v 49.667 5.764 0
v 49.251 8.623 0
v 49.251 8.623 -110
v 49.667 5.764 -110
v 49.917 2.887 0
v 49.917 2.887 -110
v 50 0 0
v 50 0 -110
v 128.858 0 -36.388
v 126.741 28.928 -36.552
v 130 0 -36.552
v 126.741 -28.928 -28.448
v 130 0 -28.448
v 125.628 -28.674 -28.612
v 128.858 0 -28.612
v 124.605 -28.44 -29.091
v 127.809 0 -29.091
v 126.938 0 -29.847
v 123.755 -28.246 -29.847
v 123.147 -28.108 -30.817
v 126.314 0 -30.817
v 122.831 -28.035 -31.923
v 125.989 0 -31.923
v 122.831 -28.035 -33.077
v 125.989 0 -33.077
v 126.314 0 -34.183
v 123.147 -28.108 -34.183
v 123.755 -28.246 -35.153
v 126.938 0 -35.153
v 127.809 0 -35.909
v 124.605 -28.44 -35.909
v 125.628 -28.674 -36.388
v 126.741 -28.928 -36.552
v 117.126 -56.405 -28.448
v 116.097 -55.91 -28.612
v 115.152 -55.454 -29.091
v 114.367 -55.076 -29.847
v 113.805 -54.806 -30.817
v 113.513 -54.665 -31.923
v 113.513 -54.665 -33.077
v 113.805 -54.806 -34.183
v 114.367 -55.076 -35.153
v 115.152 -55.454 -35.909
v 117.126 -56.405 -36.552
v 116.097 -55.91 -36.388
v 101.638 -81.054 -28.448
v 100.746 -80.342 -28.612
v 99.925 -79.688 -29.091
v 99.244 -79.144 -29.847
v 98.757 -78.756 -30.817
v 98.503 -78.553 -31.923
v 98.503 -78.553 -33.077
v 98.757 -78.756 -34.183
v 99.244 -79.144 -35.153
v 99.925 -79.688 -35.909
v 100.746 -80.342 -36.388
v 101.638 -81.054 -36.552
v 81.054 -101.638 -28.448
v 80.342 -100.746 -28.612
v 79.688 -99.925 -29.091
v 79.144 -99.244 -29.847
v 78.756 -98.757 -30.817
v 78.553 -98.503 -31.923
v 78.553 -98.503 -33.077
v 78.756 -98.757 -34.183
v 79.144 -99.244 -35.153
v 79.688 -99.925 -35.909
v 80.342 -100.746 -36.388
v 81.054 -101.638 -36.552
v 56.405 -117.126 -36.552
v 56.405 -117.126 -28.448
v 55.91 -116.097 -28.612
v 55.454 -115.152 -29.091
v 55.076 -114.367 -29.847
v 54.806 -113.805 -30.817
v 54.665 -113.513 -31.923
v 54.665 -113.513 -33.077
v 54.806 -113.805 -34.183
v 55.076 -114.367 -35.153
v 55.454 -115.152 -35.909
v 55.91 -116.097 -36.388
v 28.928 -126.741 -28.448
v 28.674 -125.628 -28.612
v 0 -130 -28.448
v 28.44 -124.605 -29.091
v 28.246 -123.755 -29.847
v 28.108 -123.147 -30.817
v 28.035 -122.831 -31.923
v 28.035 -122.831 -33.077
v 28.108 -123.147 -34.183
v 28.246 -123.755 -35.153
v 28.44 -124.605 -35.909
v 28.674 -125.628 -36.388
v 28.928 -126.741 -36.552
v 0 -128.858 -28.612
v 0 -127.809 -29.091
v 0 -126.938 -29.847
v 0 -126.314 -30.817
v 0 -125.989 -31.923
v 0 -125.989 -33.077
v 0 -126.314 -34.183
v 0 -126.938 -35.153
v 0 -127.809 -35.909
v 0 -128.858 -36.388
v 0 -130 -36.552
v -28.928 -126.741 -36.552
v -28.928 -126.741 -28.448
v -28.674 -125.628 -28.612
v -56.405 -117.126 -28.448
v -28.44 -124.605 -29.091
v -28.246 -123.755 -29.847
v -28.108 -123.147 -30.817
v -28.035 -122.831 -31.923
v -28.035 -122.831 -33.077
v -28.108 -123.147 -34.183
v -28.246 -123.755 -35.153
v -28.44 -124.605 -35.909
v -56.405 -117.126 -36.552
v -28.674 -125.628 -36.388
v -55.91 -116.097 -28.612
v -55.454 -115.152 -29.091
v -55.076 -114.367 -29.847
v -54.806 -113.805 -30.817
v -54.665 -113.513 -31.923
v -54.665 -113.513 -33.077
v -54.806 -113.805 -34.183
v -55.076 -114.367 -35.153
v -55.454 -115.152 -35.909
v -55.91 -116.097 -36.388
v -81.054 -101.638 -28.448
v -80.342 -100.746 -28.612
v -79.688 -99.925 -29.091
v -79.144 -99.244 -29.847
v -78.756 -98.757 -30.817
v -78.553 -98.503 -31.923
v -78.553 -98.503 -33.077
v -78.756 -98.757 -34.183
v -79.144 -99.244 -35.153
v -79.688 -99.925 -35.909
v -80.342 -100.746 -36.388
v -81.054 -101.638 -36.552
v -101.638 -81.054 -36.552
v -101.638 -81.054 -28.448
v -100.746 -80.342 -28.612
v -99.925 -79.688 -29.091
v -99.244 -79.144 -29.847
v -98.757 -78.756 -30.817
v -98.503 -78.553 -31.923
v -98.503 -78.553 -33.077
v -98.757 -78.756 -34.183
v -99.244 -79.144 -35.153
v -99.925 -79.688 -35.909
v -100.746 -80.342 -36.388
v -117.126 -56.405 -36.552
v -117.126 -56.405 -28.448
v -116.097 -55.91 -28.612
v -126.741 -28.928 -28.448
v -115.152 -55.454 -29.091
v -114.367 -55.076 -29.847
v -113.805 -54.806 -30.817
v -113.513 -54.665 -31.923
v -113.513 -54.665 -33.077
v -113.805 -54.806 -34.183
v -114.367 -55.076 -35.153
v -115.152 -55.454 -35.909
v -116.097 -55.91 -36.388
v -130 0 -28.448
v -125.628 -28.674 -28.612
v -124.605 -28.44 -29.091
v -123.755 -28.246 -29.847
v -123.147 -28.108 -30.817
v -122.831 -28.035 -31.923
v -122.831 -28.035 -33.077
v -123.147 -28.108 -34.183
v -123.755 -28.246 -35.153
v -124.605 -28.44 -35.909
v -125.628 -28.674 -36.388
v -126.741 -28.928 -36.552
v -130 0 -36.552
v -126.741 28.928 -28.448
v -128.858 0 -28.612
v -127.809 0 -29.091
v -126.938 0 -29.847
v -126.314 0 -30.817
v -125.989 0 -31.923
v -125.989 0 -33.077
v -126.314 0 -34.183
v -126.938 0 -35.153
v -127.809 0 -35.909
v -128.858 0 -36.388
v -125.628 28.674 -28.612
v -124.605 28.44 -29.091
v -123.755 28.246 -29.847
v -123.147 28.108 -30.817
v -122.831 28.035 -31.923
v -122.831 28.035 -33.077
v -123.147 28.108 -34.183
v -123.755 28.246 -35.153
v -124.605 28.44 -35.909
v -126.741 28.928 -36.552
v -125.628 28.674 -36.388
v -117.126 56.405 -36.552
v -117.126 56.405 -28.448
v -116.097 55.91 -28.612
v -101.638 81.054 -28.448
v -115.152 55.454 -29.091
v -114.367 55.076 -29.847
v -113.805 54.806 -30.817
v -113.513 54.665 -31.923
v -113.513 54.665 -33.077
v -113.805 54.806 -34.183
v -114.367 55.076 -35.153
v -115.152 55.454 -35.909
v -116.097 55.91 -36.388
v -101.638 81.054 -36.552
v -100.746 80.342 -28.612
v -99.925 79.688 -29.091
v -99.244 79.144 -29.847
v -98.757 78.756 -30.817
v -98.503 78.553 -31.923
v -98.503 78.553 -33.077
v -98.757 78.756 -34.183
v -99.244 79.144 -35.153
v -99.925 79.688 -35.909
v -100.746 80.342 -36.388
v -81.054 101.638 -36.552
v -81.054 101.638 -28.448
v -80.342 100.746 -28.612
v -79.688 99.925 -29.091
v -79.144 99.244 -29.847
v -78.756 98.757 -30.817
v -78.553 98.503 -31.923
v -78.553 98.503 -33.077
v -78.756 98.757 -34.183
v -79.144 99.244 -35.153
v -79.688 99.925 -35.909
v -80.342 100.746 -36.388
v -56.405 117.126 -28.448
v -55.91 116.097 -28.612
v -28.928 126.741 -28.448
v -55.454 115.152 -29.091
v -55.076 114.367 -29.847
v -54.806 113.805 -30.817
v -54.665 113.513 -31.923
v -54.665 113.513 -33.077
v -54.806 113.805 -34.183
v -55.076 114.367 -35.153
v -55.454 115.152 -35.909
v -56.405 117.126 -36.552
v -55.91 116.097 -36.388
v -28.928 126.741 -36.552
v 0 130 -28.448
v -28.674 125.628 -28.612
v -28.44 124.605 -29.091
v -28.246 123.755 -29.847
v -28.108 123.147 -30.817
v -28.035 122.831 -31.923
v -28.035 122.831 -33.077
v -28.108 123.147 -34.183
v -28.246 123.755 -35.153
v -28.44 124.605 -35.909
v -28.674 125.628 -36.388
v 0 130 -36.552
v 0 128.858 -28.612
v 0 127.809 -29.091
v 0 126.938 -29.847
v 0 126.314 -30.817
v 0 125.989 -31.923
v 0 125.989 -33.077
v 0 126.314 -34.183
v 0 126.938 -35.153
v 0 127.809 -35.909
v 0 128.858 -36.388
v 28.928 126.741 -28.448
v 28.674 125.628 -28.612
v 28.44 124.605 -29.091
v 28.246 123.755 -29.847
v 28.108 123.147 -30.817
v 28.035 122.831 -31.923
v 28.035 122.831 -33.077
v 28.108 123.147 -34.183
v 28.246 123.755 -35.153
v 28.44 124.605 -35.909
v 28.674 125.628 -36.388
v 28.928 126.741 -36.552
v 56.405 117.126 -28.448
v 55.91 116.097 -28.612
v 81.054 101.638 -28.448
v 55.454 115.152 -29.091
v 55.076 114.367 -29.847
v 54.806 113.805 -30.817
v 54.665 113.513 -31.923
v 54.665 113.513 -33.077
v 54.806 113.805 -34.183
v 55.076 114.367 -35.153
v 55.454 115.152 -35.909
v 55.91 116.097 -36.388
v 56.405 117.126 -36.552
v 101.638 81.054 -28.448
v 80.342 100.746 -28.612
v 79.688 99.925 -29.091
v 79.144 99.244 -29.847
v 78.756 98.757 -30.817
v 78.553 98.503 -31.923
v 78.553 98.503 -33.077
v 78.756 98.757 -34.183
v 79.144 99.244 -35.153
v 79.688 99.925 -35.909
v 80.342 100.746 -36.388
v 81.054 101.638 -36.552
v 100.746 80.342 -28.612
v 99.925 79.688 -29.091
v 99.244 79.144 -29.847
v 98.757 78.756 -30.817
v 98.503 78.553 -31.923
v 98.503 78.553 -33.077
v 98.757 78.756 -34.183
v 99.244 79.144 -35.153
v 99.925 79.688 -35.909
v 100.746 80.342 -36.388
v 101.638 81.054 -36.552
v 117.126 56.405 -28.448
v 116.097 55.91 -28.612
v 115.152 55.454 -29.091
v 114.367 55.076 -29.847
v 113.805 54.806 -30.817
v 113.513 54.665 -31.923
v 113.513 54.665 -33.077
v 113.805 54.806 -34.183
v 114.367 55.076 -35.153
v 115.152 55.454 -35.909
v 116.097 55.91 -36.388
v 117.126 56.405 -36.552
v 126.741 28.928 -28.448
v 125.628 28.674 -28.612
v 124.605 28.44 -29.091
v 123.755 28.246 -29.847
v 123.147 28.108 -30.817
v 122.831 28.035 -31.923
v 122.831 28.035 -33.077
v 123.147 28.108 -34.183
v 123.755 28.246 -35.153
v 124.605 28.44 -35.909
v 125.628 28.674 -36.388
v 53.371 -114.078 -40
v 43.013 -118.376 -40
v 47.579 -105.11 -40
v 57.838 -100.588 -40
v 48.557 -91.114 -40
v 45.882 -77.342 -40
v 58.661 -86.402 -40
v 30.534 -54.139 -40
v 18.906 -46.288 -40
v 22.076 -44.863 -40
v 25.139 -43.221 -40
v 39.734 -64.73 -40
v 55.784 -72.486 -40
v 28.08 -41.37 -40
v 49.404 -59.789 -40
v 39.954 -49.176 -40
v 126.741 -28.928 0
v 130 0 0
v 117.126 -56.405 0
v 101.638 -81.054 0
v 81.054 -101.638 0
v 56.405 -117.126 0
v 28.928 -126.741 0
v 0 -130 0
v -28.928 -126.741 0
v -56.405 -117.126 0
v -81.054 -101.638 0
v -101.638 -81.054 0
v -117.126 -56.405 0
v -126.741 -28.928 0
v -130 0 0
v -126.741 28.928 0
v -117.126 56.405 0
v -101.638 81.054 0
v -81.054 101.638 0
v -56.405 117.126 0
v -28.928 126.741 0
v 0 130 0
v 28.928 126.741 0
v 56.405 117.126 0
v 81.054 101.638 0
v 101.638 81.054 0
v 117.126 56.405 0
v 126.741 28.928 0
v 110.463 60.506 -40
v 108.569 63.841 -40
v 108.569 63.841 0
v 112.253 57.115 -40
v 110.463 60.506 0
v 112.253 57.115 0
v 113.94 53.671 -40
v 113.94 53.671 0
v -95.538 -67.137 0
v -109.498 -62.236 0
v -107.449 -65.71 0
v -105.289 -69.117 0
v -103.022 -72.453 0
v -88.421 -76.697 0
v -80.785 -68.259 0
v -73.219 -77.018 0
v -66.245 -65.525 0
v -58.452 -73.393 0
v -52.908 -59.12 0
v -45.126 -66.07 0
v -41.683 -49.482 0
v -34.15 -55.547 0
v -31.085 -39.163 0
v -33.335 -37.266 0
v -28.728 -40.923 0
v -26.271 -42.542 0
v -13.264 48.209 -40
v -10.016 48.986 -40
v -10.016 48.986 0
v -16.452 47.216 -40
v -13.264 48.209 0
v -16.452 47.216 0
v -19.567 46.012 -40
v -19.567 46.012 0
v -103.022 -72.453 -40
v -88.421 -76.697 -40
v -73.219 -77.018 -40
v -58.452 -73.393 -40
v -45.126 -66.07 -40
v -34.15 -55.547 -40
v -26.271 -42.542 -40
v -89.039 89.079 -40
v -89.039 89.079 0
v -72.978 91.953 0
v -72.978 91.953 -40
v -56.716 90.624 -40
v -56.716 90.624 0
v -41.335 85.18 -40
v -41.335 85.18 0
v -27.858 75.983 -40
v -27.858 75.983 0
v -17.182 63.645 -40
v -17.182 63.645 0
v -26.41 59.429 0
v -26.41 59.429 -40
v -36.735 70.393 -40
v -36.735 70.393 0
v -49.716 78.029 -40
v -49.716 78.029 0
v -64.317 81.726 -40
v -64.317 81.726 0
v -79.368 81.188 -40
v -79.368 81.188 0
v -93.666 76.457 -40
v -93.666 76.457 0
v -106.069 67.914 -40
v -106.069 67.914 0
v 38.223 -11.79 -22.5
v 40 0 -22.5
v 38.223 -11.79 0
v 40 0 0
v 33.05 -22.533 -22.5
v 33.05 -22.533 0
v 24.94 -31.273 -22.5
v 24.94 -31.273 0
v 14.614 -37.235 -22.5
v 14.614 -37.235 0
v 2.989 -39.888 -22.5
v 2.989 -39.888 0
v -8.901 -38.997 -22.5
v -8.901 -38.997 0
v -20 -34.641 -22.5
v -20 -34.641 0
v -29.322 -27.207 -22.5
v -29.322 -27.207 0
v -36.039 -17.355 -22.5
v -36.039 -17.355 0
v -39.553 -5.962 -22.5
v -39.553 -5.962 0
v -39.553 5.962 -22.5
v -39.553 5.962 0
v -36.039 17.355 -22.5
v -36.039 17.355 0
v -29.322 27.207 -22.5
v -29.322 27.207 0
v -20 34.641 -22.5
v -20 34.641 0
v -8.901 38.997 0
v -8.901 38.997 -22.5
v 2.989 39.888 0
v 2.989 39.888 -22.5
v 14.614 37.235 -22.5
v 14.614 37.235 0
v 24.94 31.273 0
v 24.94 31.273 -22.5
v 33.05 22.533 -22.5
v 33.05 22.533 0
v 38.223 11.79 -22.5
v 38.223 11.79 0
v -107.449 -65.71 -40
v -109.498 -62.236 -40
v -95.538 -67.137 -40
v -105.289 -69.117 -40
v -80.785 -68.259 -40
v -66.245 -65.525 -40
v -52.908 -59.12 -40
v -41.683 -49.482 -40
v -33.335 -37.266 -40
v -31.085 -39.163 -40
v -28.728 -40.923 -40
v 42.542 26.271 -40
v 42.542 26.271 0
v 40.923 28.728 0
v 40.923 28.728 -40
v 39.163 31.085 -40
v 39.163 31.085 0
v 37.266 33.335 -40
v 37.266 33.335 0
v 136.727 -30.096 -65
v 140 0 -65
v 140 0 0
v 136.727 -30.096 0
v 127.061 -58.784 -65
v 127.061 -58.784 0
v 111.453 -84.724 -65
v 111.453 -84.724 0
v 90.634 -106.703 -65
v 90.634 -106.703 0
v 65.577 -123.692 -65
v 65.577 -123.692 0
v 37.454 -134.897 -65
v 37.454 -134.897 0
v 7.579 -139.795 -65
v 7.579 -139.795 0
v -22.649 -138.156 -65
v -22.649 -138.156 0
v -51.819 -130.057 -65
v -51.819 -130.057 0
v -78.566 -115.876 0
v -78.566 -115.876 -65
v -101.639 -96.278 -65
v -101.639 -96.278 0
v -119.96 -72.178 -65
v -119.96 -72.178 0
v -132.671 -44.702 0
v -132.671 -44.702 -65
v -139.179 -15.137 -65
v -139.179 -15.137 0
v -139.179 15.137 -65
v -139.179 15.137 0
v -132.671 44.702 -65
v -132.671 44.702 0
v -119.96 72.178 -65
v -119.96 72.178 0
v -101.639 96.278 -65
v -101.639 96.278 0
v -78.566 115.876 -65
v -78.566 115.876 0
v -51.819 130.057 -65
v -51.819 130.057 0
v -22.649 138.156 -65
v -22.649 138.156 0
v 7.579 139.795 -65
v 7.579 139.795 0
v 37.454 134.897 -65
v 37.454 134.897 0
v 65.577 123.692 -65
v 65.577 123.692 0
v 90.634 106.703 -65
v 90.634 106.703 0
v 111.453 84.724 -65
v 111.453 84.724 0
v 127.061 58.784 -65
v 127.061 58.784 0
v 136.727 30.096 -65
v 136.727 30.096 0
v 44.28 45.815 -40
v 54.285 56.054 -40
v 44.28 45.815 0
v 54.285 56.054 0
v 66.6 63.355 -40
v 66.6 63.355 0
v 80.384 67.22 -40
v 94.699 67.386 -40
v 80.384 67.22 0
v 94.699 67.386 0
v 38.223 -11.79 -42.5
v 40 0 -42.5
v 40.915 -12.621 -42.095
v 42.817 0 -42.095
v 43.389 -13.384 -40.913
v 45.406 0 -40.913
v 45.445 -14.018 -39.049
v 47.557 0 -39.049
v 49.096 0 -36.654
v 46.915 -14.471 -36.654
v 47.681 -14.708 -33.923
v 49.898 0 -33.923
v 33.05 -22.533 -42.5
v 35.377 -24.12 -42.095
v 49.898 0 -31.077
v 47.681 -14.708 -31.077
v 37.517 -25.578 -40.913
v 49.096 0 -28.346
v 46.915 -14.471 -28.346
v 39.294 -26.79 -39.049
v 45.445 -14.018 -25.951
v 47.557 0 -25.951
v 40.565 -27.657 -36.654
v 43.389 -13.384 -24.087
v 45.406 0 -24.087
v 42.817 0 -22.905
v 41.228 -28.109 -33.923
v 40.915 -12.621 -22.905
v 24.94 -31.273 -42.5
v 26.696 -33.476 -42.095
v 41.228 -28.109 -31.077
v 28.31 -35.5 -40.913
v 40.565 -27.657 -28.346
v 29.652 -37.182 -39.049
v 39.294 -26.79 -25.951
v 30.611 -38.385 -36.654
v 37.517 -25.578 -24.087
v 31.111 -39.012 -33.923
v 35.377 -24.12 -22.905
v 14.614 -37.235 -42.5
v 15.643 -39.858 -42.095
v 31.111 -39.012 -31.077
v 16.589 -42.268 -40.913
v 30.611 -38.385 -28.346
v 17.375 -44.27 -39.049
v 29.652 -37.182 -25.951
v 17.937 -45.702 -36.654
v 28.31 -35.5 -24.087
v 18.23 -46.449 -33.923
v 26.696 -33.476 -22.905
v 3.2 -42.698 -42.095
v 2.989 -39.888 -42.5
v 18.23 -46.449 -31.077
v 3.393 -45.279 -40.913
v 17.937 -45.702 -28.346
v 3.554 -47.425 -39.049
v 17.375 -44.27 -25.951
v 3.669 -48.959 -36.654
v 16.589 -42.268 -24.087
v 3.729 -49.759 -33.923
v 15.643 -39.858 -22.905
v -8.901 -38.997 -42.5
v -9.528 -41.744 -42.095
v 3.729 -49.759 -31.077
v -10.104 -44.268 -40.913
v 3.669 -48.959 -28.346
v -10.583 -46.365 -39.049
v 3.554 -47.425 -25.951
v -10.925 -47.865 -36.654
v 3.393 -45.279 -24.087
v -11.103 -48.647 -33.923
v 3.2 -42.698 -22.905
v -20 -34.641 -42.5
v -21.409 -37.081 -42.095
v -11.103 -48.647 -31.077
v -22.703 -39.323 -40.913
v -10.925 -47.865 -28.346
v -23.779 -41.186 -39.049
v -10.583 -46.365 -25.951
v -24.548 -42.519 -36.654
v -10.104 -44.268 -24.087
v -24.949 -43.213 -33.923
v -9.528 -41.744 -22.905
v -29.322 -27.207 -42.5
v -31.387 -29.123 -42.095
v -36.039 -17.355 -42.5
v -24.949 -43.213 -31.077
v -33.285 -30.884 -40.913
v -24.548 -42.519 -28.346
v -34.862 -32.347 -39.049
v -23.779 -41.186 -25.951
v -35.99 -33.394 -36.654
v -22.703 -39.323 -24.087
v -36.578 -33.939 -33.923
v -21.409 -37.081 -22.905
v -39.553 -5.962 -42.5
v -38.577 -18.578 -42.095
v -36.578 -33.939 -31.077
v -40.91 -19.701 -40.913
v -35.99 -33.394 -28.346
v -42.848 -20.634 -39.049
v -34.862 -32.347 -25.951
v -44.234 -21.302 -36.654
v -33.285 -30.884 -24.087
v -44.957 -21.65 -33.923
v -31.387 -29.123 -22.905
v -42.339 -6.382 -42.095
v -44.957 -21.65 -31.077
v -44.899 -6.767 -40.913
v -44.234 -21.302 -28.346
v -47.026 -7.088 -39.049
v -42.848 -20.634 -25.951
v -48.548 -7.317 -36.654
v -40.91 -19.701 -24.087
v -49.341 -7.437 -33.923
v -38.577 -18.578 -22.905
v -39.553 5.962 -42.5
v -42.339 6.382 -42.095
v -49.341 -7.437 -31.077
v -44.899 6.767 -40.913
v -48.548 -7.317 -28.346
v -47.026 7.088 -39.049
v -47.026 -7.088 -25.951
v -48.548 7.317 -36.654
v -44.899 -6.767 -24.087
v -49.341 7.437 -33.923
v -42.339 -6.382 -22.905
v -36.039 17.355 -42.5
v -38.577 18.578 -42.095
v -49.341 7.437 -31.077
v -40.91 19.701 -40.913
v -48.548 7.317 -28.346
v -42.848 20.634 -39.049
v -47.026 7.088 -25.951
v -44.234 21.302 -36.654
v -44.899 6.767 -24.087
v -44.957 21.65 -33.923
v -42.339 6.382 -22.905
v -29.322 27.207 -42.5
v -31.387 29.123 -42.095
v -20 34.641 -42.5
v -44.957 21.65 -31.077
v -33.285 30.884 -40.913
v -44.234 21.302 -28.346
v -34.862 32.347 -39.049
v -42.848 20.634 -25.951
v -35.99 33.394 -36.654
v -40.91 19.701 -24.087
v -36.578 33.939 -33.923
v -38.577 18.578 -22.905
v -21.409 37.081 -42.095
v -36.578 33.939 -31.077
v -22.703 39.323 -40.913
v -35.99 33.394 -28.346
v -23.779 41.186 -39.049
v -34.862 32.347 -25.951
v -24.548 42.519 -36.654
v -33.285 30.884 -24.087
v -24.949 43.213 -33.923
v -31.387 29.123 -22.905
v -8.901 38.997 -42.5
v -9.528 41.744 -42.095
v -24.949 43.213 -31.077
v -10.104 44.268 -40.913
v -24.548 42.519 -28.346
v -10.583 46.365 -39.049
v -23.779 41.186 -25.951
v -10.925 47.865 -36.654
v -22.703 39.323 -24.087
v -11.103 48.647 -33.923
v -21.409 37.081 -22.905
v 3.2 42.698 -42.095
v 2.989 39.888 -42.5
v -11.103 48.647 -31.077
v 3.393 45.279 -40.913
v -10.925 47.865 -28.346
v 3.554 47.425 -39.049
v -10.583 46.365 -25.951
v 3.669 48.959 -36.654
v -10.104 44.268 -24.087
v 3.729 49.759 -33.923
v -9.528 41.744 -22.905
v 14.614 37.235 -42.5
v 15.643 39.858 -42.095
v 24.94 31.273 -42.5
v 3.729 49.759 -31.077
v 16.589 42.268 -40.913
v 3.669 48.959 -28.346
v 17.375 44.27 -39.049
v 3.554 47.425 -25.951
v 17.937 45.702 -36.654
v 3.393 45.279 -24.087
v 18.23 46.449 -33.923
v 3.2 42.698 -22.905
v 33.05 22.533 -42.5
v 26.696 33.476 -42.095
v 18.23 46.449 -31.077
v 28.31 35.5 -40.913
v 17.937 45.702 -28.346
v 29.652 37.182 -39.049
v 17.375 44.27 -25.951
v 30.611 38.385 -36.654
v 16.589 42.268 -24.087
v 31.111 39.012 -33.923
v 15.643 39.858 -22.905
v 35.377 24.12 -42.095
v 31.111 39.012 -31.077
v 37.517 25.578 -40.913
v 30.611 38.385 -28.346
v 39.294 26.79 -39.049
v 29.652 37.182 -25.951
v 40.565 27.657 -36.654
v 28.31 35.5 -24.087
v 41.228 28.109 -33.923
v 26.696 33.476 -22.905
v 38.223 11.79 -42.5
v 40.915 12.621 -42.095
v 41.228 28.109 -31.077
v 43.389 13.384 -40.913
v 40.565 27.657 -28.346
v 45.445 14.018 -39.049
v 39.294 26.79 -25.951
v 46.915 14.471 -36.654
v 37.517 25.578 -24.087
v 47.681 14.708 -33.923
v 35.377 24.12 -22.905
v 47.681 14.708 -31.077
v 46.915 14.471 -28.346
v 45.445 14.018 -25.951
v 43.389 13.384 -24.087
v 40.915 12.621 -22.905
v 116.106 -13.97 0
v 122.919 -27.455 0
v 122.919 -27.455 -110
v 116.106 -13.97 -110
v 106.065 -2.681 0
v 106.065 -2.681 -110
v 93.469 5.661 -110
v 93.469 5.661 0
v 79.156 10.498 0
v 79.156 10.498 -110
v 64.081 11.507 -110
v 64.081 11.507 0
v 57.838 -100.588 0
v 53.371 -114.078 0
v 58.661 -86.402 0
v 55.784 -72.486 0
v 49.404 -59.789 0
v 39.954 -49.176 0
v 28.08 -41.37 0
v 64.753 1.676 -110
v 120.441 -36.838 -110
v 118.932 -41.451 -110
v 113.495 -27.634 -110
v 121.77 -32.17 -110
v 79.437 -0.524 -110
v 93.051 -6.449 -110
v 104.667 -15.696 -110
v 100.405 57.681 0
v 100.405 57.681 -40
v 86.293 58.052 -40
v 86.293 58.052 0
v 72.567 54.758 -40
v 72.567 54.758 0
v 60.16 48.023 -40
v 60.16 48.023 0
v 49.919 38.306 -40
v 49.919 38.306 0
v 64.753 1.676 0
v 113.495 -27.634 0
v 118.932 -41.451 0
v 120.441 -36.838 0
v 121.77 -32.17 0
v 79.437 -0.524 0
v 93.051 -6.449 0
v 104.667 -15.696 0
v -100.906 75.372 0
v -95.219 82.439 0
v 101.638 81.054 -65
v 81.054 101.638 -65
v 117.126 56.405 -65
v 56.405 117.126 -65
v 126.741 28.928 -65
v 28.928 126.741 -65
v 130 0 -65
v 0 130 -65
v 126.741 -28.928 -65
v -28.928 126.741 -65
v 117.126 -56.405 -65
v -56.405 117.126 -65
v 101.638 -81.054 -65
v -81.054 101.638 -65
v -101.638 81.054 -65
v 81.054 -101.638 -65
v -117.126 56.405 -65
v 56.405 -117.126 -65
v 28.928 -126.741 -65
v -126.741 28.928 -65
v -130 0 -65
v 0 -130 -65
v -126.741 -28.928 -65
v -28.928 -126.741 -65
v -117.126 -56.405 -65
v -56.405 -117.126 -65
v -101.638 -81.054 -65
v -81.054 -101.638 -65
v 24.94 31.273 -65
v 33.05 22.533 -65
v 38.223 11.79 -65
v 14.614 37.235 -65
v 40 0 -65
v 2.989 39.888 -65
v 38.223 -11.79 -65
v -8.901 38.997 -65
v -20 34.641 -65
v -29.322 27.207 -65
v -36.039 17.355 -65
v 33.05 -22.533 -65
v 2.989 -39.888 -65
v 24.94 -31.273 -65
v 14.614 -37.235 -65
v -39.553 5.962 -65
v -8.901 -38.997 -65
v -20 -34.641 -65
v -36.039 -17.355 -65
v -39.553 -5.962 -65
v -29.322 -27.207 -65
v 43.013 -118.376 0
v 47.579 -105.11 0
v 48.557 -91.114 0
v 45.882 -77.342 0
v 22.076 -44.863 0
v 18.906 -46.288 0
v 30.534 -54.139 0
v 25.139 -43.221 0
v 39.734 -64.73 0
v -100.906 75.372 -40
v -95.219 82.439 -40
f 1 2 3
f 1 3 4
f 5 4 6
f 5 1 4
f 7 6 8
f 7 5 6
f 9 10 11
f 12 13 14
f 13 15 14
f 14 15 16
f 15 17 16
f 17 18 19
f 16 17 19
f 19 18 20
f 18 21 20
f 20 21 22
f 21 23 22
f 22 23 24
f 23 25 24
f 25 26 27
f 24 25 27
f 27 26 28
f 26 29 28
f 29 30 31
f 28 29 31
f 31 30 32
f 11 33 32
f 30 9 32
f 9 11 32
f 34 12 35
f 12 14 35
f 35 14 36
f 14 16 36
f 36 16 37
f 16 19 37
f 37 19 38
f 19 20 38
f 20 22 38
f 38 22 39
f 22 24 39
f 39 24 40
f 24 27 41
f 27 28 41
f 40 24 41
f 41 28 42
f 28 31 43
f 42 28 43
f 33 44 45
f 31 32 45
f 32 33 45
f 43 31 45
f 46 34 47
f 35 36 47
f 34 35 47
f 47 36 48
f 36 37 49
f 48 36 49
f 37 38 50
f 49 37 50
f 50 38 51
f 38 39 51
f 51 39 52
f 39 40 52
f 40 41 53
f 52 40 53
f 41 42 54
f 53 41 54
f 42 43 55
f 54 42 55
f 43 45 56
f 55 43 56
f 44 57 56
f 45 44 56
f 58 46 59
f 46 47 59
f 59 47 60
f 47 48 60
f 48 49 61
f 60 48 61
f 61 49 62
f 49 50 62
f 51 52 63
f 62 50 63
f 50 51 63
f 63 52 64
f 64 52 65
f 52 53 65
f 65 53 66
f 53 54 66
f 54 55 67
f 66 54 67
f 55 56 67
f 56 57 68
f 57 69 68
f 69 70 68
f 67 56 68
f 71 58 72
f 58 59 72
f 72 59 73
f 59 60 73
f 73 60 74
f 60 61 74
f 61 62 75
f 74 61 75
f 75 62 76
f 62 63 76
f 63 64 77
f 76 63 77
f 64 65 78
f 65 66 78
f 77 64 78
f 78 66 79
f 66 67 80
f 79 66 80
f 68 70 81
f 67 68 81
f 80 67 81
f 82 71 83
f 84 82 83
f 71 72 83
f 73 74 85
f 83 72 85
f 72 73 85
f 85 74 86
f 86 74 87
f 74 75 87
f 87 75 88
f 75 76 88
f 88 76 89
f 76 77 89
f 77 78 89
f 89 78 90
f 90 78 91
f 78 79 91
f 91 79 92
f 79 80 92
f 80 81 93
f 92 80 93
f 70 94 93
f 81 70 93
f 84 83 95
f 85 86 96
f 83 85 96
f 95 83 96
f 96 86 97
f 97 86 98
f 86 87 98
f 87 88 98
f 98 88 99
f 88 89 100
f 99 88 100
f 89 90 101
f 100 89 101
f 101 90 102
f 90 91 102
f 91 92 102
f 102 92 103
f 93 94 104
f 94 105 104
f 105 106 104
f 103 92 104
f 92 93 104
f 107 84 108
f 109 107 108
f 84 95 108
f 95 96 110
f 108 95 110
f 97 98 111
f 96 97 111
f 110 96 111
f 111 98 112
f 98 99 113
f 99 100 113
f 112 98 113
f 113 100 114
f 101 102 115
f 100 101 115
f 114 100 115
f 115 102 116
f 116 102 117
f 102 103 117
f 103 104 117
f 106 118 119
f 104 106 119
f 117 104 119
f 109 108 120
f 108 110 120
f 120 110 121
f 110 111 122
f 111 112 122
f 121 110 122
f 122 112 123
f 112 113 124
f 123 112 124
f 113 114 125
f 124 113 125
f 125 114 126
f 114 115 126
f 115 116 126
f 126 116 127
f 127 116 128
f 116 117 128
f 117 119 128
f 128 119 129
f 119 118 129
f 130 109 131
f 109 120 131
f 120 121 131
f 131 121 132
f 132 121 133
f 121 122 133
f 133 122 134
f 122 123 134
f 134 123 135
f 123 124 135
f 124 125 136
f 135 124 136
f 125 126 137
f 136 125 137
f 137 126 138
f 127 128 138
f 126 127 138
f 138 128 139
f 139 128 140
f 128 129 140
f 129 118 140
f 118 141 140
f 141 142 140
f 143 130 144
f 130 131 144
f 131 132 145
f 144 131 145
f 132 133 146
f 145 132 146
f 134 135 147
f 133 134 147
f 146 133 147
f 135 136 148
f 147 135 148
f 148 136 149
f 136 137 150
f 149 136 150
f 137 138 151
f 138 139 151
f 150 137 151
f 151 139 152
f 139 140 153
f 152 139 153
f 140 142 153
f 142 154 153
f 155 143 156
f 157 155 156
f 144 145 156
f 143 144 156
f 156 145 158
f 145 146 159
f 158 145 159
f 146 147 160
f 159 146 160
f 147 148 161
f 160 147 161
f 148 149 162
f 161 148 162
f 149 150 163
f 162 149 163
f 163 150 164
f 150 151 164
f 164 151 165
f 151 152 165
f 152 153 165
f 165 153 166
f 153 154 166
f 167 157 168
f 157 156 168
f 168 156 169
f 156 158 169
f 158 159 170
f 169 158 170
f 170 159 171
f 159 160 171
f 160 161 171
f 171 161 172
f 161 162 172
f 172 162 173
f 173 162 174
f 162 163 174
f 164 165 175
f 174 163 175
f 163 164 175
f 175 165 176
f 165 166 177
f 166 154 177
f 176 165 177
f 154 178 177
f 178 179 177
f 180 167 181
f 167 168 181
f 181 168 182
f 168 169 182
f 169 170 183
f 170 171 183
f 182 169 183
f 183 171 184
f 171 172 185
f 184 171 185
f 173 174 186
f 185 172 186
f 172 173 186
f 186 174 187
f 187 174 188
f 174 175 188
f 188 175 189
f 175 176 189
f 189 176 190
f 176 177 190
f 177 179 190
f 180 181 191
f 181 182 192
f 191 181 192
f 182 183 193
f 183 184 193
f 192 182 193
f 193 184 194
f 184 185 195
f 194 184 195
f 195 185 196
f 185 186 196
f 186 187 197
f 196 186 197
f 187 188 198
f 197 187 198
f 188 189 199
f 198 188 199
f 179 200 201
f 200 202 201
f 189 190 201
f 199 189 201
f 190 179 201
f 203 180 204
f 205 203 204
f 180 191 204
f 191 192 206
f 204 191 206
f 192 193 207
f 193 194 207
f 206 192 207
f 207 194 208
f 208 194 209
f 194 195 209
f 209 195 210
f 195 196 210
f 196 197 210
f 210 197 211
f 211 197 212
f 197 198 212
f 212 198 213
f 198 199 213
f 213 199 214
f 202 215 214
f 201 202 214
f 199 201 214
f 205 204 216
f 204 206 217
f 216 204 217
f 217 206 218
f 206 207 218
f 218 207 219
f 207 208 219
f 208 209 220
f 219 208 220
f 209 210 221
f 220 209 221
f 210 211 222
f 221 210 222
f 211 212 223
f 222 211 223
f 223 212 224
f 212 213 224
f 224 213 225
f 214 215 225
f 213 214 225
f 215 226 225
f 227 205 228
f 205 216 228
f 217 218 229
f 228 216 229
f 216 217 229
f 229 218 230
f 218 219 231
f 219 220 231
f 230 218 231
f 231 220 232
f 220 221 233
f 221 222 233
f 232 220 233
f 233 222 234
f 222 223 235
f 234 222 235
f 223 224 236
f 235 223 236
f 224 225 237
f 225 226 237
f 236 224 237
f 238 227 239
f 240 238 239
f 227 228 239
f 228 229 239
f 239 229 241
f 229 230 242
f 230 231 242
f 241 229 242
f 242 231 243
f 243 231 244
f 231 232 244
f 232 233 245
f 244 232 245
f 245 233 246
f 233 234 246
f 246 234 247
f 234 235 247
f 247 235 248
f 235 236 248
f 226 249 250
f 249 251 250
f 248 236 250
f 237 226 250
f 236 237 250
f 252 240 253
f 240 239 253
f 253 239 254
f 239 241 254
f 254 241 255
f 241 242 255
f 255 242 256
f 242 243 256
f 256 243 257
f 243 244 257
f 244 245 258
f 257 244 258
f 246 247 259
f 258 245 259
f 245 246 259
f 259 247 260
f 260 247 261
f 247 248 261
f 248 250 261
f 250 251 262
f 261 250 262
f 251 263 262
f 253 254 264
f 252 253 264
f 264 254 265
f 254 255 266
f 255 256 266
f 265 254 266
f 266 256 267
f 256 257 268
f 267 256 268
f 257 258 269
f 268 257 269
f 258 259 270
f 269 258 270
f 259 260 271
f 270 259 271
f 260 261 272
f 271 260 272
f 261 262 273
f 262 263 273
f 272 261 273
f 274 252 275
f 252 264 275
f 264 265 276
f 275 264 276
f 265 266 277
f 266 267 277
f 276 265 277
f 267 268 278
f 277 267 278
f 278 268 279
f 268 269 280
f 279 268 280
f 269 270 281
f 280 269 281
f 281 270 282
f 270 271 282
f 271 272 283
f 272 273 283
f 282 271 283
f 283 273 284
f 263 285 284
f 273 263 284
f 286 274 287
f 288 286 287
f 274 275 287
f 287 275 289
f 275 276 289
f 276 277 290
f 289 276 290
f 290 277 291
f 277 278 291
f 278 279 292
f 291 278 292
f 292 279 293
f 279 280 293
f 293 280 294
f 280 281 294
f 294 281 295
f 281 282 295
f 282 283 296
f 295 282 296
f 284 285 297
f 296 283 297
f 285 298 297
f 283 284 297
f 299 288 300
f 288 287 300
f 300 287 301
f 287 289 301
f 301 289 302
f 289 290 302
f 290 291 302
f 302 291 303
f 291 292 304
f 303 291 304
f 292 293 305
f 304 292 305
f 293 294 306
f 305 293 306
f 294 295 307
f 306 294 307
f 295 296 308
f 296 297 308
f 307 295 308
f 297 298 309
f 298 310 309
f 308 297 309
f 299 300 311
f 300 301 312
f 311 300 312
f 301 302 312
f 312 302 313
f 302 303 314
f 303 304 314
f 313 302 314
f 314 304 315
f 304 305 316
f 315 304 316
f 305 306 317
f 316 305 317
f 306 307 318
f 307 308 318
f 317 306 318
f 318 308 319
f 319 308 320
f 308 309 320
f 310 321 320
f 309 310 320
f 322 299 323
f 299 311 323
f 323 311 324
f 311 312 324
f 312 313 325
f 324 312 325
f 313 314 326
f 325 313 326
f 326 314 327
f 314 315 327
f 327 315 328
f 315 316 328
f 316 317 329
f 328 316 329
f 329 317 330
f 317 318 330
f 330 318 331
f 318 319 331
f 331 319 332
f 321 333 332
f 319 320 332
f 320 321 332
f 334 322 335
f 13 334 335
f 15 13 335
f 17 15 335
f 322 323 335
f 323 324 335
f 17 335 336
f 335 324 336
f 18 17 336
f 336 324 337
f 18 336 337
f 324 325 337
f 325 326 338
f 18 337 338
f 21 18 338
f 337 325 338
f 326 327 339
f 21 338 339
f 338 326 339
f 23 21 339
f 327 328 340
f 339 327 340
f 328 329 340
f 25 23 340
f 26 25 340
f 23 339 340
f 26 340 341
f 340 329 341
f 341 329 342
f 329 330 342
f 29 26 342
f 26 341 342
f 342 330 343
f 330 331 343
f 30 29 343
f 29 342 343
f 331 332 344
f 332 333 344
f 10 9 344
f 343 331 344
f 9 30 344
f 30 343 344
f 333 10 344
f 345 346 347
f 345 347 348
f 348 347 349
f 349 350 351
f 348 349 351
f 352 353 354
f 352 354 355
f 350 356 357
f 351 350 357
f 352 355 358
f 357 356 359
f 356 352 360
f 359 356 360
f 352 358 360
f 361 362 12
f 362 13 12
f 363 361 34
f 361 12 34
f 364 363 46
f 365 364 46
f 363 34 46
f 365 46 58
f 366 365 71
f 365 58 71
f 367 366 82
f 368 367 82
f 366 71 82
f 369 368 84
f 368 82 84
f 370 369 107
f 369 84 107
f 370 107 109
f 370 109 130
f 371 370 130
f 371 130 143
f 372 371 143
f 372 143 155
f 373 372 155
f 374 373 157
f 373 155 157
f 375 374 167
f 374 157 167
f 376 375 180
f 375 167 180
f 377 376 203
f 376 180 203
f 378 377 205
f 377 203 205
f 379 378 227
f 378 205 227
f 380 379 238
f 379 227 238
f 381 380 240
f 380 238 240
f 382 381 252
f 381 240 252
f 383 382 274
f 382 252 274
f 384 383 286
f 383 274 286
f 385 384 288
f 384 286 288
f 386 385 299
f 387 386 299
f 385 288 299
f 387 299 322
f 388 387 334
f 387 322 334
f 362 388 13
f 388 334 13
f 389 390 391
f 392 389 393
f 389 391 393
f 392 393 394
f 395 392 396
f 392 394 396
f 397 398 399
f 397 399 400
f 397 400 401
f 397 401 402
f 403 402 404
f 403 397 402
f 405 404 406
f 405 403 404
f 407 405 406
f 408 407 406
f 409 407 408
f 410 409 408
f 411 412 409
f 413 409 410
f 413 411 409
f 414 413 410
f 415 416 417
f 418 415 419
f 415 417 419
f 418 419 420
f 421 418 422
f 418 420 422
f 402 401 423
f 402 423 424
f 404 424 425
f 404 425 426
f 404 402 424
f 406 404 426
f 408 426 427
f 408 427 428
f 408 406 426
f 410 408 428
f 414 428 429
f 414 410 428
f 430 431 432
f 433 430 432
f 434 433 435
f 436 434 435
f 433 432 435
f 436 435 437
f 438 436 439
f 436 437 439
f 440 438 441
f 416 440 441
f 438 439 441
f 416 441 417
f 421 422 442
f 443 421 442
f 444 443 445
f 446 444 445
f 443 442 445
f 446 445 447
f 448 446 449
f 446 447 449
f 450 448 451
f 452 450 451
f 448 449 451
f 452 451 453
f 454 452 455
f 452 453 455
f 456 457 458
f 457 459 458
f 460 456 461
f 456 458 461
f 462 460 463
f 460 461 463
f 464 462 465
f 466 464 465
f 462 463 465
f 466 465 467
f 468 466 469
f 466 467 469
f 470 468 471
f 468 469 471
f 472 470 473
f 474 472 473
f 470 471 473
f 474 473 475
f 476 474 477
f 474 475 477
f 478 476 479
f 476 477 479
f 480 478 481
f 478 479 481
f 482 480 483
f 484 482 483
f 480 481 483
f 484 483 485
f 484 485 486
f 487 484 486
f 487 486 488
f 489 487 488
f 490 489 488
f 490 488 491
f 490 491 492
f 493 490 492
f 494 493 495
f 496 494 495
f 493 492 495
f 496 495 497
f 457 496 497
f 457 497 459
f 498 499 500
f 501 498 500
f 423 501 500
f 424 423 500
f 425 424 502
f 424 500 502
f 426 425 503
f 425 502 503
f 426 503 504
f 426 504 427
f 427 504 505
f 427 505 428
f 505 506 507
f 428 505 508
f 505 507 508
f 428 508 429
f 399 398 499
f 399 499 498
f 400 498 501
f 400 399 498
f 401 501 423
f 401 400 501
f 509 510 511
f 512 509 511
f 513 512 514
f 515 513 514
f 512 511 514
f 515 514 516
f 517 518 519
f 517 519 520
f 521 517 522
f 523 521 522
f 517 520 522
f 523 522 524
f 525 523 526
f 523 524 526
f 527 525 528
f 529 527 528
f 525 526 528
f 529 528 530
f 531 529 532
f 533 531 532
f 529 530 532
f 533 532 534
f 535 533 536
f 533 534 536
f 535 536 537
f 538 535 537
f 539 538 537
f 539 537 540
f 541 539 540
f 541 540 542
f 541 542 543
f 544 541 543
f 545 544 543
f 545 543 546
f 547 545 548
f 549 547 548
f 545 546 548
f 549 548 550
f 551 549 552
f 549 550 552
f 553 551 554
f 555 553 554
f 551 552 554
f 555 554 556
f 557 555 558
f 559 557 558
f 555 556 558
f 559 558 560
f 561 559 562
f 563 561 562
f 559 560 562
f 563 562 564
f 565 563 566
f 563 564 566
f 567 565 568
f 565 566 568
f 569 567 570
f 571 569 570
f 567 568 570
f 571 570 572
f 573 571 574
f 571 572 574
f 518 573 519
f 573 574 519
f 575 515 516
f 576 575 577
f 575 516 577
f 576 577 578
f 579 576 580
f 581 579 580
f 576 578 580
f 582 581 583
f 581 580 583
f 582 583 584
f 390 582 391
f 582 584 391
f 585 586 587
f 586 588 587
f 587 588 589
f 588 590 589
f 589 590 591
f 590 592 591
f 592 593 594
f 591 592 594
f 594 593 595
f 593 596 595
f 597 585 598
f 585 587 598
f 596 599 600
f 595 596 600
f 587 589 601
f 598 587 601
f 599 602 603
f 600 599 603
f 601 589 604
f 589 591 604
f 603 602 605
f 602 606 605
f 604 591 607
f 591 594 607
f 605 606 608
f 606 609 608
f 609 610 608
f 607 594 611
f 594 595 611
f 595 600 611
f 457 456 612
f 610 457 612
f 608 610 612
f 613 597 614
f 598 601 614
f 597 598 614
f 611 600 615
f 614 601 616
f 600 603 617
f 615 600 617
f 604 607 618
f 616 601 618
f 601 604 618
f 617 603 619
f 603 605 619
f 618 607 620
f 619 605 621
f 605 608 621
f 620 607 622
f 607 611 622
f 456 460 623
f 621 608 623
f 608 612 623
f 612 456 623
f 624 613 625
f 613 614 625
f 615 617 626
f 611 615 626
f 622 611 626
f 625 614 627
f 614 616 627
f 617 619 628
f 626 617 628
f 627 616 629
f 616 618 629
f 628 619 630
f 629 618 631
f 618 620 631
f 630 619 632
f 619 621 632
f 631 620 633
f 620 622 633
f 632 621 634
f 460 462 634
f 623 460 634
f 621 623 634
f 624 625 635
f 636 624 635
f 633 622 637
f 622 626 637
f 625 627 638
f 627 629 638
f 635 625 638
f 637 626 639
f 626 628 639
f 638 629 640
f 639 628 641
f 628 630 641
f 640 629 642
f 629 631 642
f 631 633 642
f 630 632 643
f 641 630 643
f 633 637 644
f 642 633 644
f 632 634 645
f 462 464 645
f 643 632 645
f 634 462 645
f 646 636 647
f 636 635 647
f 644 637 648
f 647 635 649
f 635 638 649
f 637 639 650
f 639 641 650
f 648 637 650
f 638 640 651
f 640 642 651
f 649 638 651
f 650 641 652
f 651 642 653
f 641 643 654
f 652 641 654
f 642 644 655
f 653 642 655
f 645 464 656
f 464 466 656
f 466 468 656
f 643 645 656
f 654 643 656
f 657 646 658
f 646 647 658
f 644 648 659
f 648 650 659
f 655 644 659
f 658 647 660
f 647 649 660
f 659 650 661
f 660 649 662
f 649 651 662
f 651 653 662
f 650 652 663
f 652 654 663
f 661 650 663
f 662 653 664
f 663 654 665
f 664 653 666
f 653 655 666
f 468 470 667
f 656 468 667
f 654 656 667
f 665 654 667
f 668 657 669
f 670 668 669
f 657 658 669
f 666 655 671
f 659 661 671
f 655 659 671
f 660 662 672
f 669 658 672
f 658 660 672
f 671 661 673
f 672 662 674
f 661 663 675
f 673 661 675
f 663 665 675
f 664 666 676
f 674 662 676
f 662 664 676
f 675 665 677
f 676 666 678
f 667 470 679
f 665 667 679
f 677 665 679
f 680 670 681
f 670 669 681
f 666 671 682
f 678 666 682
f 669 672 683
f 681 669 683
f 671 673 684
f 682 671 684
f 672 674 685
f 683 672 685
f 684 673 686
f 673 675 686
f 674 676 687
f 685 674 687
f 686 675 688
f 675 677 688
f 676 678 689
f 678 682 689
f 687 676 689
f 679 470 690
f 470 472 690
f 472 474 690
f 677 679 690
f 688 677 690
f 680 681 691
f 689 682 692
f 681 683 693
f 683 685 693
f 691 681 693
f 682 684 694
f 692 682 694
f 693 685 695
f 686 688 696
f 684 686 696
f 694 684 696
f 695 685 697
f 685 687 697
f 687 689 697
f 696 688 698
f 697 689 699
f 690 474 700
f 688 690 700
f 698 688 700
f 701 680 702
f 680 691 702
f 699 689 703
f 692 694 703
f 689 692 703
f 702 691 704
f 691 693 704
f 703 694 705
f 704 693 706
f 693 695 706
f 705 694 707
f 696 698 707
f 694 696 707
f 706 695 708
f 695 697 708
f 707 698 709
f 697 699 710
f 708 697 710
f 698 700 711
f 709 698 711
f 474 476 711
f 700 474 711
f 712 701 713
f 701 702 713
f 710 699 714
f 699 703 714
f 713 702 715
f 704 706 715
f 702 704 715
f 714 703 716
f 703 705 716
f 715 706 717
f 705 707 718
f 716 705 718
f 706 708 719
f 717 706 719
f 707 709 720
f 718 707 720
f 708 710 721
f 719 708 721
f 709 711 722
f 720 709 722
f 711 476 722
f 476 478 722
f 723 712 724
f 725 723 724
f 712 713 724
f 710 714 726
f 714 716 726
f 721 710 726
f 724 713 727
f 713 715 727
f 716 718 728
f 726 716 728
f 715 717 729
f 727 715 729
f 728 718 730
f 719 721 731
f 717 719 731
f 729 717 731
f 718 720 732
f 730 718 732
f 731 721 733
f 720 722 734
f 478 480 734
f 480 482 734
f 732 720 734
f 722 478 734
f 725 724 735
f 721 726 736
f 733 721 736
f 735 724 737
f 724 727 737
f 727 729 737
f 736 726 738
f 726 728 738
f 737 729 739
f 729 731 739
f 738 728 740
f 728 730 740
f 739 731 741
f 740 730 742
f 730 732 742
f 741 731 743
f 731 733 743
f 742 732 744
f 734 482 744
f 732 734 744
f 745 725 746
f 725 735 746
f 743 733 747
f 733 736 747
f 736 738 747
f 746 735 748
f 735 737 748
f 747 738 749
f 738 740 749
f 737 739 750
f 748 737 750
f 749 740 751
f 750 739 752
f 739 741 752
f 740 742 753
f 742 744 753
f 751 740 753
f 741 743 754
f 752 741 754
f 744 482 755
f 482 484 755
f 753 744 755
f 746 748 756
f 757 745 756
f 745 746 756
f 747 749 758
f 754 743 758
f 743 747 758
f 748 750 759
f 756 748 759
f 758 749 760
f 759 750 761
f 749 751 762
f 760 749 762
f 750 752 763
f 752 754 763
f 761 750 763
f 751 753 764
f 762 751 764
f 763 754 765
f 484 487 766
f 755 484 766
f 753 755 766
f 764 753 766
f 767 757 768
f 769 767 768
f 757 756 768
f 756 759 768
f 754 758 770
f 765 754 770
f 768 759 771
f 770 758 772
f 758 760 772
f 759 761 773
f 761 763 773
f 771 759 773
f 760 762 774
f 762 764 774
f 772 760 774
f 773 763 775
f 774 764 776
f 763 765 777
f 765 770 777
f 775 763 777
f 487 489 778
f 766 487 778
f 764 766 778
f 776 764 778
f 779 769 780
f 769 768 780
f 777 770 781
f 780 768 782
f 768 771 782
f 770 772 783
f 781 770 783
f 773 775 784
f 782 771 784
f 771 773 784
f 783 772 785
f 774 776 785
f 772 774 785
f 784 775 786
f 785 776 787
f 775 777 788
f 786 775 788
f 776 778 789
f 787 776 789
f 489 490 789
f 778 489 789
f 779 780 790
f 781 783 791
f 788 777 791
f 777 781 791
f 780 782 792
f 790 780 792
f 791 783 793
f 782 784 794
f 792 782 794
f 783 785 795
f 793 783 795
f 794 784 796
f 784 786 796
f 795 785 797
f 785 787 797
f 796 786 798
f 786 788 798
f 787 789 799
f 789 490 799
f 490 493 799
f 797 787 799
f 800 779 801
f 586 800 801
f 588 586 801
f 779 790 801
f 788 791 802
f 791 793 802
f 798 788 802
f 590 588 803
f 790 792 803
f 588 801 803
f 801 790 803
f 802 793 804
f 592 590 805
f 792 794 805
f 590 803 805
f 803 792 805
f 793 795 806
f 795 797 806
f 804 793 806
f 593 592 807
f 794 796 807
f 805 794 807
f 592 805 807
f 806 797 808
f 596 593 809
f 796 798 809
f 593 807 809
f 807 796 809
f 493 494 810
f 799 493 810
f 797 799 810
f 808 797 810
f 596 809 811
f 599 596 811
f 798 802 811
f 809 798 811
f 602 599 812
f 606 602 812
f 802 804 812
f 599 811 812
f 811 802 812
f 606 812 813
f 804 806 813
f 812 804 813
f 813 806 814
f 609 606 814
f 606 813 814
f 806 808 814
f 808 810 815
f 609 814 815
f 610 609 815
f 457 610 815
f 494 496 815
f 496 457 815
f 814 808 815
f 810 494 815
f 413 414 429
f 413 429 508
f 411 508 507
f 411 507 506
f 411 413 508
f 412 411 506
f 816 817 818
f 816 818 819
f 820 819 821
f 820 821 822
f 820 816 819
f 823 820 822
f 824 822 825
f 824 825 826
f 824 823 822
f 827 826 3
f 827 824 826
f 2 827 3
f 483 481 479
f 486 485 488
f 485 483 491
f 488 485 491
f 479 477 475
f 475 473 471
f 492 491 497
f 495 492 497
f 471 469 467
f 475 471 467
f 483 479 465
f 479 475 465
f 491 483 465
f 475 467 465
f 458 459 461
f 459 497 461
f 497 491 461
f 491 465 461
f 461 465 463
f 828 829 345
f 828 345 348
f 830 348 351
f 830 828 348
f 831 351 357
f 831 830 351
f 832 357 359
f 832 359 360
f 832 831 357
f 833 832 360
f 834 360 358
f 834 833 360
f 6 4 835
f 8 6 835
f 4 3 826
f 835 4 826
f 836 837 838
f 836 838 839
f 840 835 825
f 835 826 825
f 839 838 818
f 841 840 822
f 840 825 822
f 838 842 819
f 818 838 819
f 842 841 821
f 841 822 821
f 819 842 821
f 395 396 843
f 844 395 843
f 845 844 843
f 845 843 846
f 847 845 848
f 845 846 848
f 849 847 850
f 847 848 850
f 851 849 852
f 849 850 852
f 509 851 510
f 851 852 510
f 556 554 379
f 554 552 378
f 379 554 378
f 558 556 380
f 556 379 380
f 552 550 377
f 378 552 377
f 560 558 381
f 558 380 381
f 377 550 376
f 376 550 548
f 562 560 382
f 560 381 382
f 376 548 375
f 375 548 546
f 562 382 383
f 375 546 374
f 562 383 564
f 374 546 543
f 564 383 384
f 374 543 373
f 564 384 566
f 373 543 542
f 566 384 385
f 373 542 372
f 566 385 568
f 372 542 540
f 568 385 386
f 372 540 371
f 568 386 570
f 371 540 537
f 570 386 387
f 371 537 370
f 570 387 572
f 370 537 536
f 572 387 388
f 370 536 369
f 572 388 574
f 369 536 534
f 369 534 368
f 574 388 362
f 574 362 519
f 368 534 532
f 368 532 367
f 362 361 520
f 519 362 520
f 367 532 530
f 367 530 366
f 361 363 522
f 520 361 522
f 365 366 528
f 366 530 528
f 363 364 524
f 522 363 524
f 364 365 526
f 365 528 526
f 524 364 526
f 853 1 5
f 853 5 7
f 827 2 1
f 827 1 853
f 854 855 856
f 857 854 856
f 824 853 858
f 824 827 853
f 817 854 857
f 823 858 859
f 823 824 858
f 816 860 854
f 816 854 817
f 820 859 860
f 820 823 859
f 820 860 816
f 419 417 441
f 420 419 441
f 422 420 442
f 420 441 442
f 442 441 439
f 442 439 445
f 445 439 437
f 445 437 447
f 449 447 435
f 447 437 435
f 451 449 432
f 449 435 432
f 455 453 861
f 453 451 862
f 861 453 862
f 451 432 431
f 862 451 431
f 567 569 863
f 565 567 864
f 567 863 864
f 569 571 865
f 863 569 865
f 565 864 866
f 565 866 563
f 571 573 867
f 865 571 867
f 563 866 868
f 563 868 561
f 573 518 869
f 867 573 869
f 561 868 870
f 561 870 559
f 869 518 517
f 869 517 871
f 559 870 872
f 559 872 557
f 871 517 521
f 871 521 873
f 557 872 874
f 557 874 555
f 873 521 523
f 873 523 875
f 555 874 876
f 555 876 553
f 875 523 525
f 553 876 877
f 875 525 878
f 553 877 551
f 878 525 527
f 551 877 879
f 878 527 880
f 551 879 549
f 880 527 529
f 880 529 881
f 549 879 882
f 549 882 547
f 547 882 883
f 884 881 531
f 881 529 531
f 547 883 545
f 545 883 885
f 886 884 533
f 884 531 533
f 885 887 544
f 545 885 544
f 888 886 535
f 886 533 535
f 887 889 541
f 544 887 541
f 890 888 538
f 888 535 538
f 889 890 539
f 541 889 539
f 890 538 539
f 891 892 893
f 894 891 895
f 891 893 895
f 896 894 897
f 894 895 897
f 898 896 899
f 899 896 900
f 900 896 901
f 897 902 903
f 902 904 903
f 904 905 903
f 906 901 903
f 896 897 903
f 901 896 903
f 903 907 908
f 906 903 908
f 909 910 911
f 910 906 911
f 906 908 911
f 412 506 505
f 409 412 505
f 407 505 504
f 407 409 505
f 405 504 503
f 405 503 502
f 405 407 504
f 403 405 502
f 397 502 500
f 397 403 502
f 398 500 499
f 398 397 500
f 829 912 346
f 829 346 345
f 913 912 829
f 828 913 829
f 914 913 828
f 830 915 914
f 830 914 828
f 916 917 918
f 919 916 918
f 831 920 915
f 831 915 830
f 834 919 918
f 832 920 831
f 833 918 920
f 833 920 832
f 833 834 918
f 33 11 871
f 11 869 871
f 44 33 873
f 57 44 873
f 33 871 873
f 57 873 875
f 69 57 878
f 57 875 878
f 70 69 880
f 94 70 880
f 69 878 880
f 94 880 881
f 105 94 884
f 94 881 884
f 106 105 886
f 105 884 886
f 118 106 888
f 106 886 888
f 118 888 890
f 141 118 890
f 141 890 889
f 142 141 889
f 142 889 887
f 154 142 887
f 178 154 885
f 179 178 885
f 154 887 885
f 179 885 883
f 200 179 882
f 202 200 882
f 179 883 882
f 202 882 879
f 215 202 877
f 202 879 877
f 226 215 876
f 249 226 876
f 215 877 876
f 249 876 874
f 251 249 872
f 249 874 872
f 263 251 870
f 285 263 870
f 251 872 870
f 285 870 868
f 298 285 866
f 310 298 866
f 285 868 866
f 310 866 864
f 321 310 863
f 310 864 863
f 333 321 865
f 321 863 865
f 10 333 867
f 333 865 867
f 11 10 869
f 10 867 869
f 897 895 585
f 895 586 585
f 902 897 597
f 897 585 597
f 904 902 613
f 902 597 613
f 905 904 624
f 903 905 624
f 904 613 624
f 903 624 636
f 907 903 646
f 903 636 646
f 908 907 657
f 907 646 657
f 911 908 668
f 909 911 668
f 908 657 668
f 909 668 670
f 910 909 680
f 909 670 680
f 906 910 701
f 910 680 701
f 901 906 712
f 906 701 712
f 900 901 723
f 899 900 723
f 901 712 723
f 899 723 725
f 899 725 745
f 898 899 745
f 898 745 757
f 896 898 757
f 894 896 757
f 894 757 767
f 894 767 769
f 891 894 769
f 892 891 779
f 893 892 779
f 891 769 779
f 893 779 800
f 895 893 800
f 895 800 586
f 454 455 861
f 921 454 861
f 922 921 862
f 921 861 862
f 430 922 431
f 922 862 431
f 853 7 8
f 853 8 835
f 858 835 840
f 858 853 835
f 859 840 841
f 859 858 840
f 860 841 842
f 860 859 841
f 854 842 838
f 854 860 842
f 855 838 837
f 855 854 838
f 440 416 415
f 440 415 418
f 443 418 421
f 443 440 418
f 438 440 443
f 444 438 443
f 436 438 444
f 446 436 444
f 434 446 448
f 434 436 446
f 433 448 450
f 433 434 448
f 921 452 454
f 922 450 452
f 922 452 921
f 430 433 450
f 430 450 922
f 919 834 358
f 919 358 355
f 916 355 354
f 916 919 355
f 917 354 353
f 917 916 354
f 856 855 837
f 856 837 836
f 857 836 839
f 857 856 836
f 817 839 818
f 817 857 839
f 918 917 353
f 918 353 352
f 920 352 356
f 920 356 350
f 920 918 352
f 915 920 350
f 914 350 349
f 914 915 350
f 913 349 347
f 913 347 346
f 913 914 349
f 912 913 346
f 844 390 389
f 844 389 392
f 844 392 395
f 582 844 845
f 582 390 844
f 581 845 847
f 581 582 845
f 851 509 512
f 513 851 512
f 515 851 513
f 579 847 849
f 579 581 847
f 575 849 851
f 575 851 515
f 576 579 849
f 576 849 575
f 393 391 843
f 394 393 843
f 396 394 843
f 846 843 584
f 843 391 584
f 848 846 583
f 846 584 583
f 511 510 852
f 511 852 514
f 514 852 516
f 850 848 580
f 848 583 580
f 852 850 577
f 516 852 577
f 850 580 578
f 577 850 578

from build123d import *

# Parameters (mm, degrees)
BOSS_EXTRUDE2_DEPTH = 40
BOSS_EXTRUDE3_DEPTH = 110
BOSS_EXTRUDE4_DEPTH = 40
BOSS_EXTRUDE5_DEPTH = 40
BOSS_EXTRUDE6_DEPTH = 40


with BuildPart() as part:
    # Sketch1 → Revolve3 (revolve)
    with BuildSketch(Plane(origin=(0, 0, 0), x_dir=(1, 0, 0), z_dir=(0, 1, 0))):
        with BuildLine():
            Line((0, 0), (0, 65))
            Line((0, 65), (40, 65))
            Line((40, 65), (40, 42.5))
            ThreePointArc((40, 42.5), (50, 32.5), (40, 22.5))
            Line((40, 22.5), (40, 0))
            Line((40, 0), (0, 0))
        make_face()
        with BuildLine():
            Line((130, 36.551745653), (130, 65))
            Line((130, 65), (140, 65))
            Line((140, 65), (140, 0))
            Line((140, 0), (130, 0))
            Line((130, 0), (130, 28.448254347))
            ThreePointArc((130, 28.448254347), (125.948254347, 32.5), (130, 36.551745653))
        make_face()
    revolve(axis=Axis((0, 0, 0), (0, 0, -1)))


with BuildPart() as body_2:
    # Sketch2 → Boss-Extrude2 (new body)
    with BuildSketch(Plane.XY):
        with BuildLine():
            ThreePointArc((-89.038527845, 89.079196967), (-41.335108568, 85.179792965), (-10.016367123, 48.986451082))
            ThreePointArc((-10.016367123, 48.986451082), (-14.866374615, 47.7387778), (-19.56724703, 46.012203204))
            ThreePointArc((-19.56724703, 46.012203204), (-56.885182963, 80.396223361), (-106.06928282, 67.913695343))
            ThreePointArc((-106.06928282, 67.913695343), (-98.126240427, 78.956973806), (-89.038527845, 89.079196967))
        make_face()
    extrude(amount=-BOSS_EXTRUDE2_DEPTH)


with BuildPart() as body_3:
    # Sketch5 → Boss-Extrude3 (new body)
    with BuildSketch(Plane.XY):
        with BuildLine():
            ThreePointArc((50, 0), (93.050676183, -6.448972777), (118.931988865, -41.450510223))
            ThreePointArc((118.931988865, -41.450510223), (121.12803337, -34.510321717), (122.919460364, -27.454854525))
            ThreePointArc((122.919460364, -27.454854525), (93.468634985, 5.660563455), (49.250896673, 8.622596878))
            ThreePointArc((49.250896673, 8.622596878), (49.812372126, 4.327537773), (50, 0))
        make_face()
    extrude(amount=-BOSS_EXTRUDE3_DEPTH)


with BuildPart() as body_4:
    # Sketch6 → Boss-Extrude4 (new body)
    with BuildSketch(Plane.XY):
        with BuildLine():
            ThreePointArc((-33.334867895, -37.266427014), (-66.244925523, -65.524764115), (-109.497512234, -62.235501024))
            ThreePointArc((-109.497512234, -62.235501024), (-106.382577731, -67.42188019), (-103.022181799, -72.452693741))
            ThreePointArc((-103.022181799, -72.452693741), (-58.451779697, -73.393299216), (-26.270637621, -42.542374158))
            ThreePointArc((-26.270637621, -42.542374158), (-29.919274331, -40.060417166), (-33.334867895, -37.266427014))
        make_face()
    extrude(amount=-BOSS_EXTRUDE4_DEPTH)


with BuildPart() as body_5:
    # Sketch7 → Boss-Extrude5 (new body)
    with BuildSketch(Plane.XY):
        with BuildLine():
            ThreePointArc((37.266427014, 33.334867895), (66.599765306, 63.355287149), (108.569209756, 63.84112676))
            ThreePointArc((108.569209756, 63.84112676), (111.370895488, 58.817398881), (113.940281582, 53.670988496))
            ThreePointArc((113.940281582, 53.670988496), (72.566529397, 54.757803848), (42.542374158, 26.270637621))
            ThreePointArc((42.542374158, 26.270637621), (40.060417166, 29.919274331), (37.266427014, 33.334867895))
        make_face()
    extrude(amount=-BOSS_EXTRUDE5_DEPTH)


with BuildPart() as body_6:
    # Sketch8 → Boss-Extrude6 (new body)
    with BuildSketch(Plane.XY):
        with BuildLine():
            Line((43.012559071, -118.376021792), (53.371321769, -114.077641304))
            ThreePointArc((53.371321769, -114.077641304), (55.784014775, -72.485996849), (28.080312525, -41.370231429))
            ThreePointArc((28.080312525, -41.370231429), (23.621596051, -44.068358263), (18.906254171, -46.28772573))
            ThreePointArc((18.906254171, -46.28772573), (45.881676765, -77.341871034), (43.012559071, -118.376021792))
        make_face()
    extrude(amount=-BOSS_EXTRUDE6_DEPTH)


solid = Compound([part.part, body_2.part, body_3.part, body_4.part, body_5.part, body_6.part])
